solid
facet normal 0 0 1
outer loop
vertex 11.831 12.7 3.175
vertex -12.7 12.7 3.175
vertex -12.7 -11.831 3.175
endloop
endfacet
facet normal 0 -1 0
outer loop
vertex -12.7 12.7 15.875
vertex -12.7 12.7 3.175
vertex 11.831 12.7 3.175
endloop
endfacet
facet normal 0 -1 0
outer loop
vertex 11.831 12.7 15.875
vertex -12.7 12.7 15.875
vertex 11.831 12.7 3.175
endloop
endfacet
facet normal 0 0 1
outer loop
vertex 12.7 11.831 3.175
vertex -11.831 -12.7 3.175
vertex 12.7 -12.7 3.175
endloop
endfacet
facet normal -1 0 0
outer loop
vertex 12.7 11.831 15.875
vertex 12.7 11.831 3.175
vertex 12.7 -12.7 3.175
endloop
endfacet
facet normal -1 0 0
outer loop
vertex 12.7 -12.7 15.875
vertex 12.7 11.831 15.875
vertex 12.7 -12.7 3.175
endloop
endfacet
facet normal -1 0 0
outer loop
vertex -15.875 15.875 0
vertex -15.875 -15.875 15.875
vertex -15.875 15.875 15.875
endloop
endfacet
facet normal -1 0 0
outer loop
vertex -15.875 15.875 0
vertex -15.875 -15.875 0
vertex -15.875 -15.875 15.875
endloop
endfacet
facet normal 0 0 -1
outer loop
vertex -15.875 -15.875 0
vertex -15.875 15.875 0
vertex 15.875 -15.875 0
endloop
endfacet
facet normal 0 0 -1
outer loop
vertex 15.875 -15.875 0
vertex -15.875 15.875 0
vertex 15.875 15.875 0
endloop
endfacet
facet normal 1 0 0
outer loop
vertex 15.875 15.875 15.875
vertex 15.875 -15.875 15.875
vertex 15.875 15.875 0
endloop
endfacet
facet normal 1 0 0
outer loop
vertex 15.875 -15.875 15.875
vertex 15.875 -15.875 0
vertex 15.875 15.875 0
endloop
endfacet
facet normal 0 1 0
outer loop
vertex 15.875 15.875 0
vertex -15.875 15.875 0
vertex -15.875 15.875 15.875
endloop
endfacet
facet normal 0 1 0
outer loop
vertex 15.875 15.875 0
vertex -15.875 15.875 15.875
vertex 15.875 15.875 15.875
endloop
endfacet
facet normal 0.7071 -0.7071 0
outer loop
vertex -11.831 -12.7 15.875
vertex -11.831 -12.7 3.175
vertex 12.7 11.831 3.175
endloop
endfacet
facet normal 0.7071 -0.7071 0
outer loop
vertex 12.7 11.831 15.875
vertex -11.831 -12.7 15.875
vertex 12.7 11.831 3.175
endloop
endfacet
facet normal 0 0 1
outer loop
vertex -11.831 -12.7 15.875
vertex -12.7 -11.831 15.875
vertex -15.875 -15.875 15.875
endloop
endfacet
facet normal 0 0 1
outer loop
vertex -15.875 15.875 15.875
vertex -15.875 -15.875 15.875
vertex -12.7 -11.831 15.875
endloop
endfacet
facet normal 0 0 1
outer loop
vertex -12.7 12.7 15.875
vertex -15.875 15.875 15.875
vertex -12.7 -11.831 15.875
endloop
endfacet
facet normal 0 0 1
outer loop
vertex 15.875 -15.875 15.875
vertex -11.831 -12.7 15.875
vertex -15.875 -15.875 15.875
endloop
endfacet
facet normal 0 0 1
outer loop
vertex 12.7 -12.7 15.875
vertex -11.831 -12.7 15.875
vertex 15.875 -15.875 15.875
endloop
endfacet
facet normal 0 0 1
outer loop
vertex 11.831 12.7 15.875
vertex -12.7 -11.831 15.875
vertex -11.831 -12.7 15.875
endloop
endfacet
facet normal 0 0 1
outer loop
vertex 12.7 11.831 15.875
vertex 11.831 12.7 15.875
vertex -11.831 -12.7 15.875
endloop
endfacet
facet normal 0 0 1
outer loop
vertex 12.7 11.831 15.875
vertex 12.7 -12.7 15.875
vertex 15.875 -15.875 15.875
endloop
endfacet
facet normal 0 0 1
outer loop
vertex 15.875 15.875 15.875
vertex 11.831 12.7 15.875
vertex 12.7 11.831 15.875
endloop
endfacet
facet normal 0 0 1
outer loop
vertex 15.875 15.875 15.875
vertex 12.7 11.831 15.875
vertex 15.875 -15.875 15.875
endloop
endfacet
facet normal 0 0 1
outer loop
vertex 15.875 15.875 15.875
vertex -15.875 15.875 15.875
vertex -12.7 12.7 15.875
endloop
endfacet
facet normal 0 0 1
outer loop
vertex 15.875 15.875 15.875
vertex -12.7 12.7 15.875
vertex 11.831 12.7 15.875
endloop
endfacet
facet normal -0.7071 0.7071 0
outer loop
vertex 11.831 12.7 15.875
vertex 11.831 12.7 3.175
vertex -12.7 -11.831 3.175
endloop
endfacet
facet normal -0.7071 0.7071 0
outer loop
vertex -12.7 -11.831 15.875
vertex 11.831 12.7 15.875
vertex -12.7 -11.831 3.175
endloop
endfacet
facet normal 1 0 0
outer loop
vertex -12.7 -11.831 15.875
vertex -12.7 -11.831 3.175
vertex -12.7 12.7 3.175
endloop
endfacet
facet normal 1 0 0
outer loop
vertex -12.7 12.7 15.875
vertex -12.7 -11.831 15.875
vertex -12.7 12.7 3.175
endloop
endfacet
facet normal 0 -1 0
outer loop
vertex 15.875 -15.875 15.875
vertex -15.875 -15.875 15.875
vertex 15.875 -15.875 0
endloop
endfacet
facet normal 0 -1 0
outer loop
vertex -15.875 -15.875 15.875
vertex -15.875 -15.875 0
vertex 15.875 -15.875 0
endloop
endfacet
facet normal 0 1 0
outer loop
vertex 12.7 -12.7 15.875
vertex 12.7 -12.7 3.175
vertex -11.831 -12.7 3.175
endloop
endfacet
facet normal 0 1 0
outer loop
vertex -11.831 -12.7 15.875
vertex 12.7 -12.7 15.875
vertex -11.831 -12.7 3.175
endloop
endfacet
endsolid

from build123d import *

# Parameters (mm, degrees)
F0_W     = 31.75
F0_H     = 31.75
F1_DEPTH = 3.175
F2_W     = 31.75
F2_H     = 31.75
F3_DEPTH = 12.7


# Not quite as in the source:
# - a length typed as a fraction of an inch, garbled in the dataset ("3 / 203.2 mm" for 3/8 in), is restored


with BuildPart() as f1:
    # F0 (on Top) → F1 (new body)
    with BuildSketch(Plane.XY):
        Rectangle(F0_W, F0_H)
    extrude(amount=F1_DEPTH)

    # F2 (on face) → F3 (join)
    with BuildSketch(Plane.XY.offset(3.175)):
        Rectangle(F2_W, F2_H)
        Polygon((12.7, 11.8309138343), (12.7, -12.7), (-11.8309138343, -12.7), (-12.7, -12.7), (-12.7, -11.8309138343), (-12.7, 12.7), (11.8309138343, 12.7), (12.7, 12.7), align=None, mode=Mode.SUBTRACT)
        Polygon((-12.7, -11.8309138343), (-12.7, -12.7), (12.7, 12.7), (11.8309138343, 12.7), align=None)
        Polygon((-12.7, -12.7), (-11.8309138343, -12.7), (12.7, 11.8309138343), (12.7, 12.7), align=None)
    extrude(amount=F3_DEPTH)


solid = f1.part
